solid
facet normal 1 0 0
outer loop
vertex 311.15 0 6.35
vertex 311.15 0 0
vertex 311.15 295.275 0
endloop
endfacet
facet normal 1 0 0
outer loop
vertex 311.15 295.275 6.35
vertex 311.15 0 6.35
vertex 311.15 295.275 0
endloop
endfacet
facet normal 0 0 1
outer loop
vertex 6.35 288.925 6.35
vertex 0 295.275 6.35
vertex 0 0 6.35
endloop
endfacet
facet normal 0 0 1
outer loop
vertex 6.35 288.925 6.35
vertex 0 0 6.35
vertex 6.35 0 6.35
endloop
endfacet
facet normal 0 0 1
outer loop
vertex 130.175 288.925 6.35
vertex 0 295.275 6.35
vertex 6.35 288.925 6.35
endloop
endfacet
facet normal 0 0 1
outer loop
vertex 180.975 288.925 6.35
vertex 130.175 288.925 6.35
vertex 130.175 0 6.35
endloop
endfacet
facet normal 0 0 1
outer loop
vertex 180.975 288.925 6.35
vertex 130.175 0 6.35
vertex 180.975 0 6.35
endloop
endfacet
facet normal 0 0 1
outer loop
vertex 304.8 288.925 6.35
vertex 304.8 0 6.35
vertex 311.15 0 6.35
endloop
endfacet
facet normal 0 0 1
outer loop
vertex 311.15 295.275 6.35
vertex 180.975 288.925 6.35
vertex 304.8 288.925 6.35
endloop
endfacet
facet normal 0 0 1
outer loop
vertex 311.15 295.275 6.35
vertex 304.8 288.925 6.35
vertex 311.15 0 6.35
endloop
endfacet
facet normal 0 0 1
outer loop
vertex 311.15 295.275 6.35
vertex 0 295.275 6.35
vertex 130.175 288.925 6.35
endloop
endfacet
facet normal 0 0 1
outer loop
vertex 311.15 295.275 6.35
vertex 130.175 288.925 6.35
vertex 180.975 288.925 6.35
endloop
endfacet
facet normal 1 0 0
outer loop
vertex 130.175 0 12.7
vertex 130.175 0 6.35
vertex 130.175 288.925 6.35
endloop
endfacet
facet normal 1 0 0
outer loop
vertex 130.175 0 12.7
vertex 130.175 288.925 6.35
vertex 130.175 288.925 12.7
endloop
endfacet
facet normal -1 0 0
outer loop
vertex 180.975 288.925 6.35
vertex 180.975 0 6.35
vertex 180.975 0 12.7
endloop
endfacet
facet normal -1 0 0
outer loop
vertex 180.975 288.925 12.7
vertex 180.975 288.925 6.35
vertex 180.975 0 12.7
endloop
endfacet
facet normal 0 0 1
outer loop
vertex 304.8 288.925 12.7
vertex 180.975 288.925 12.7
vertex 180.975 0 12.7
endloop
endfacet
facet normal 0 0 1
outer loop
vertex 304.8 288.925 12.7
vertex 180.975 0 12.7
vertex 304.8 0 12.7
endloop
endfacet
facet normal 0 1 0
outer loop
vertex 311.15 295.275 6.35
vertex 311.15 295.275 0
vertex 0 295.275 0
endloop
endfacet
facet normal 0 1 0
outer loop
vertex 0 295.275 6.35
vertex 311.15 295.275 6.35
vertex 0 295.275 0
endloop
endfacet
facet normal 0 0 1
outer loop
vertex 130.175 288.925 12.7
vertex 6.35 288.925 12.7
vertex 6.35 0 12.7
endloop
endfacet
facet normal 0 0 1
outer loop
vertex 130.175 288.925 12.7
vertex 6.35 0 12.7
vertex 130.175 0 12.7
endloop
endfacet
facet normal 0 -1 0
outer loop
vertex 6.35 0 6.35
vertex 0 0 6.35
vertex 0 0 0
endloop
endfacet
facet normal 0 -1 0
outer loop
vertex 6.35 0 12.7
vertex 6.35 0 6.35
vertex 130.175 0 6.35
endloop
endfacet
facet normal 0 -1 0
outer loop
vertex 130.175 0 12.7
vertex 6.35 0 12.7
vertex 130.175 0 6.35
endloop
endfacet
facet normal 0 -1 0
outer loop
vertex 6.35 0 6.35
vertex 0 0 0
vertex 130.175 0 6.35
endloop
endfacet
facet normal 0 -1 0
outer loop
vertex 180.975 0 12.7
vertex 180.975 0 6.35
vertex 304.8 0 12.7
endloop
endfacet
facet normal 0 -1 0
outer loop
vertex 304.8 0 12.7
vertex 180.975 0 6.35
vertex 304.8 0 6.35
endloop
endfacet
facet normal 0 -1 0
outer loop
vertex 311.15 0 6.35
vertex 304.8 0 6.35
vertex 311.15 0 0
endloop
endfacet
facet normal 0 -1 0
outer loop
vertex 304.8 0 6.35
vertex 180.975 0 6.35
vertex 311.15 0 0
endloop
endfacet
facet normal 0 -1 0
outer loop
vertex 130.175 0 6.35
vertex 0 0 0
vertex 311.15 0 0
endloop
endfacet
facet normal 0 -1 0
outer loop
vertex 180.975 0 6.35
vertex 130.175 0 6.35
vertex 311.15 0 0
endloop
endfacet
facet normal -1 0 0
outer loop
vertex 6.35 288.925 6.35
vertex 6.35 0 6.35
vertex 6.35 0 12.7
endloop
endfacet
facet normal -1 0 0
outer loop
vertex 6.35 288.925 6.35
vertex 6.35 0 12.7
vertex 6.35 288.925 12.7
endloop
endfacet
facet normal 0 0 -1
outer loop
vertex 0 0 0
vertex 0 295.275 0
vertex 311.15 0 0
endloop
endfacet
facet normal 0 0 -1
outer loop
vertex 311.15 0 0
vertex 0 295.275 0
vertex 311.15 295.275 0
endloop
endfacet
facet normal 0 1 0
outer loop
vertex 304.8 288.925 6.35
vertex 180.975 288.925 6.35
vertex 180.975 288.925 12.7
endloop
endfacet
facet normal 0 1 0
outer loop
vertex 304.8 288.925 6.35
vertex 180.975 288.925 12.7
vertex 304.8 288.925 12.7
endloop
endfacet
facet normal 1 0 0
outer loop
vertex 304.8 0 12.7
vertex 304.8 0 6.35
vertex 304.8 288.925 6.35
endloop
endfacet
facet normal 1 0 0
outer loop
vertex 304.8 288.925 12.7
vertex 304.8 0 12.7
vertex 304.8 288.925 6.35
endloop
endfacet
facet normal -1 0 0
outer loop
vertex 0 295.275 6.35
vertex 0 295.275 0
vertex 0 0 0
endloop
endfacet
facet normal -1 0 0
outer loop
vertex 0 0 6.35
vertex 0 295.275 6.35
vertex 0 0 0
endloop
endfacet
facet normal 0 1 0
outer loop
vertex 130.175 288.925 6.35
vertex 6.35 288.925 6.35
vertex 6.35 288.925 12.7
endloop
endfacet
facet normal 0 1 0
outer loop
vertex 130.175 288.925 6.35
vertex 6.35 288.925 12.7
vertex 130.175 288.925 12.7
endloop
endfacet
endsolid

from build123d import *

# Parameters (mm, degrees)
F1_DEPTH = 6.35
F0_W     = 298.45
F0_H     = 288.925
F2_DEPTH = 12.7
F3_W     = 50.8
F3_H     = 6.35
F4_DEPTH = 295.276


with BuildPart() as f1:
    # F0 (on Top) → F1 (new body)
    with BuildSketch(Plane.XY):
        Polygon((0, 295.275), (0, 0), (6.35, 0), (6.35, 288.925), (304.8, 288.925), (304.8, 0), (311.15, 0), (311.15, 295.275), align=None)
    extrude(amount=F1_DEPTH)

    # F0 (on Top) → F2 (join)
    with BuildSketch(Plane.XY):
        with Locations((155.575, 144.4625)):
            Rectangle(F0_W, F0_H)
    extrude(amount=F2_DEPTH)

    # F3 (on face) → F4 (cut, through all)
    with BuildSketch(Plane.XZ):
        with Locations((155.575, 9.525)):
            Rectangle(F3_W, F3_H)
    extrude(amount=-F4_DEPTH, mode=Mode.SUBTRACT)


solid = f1.part
